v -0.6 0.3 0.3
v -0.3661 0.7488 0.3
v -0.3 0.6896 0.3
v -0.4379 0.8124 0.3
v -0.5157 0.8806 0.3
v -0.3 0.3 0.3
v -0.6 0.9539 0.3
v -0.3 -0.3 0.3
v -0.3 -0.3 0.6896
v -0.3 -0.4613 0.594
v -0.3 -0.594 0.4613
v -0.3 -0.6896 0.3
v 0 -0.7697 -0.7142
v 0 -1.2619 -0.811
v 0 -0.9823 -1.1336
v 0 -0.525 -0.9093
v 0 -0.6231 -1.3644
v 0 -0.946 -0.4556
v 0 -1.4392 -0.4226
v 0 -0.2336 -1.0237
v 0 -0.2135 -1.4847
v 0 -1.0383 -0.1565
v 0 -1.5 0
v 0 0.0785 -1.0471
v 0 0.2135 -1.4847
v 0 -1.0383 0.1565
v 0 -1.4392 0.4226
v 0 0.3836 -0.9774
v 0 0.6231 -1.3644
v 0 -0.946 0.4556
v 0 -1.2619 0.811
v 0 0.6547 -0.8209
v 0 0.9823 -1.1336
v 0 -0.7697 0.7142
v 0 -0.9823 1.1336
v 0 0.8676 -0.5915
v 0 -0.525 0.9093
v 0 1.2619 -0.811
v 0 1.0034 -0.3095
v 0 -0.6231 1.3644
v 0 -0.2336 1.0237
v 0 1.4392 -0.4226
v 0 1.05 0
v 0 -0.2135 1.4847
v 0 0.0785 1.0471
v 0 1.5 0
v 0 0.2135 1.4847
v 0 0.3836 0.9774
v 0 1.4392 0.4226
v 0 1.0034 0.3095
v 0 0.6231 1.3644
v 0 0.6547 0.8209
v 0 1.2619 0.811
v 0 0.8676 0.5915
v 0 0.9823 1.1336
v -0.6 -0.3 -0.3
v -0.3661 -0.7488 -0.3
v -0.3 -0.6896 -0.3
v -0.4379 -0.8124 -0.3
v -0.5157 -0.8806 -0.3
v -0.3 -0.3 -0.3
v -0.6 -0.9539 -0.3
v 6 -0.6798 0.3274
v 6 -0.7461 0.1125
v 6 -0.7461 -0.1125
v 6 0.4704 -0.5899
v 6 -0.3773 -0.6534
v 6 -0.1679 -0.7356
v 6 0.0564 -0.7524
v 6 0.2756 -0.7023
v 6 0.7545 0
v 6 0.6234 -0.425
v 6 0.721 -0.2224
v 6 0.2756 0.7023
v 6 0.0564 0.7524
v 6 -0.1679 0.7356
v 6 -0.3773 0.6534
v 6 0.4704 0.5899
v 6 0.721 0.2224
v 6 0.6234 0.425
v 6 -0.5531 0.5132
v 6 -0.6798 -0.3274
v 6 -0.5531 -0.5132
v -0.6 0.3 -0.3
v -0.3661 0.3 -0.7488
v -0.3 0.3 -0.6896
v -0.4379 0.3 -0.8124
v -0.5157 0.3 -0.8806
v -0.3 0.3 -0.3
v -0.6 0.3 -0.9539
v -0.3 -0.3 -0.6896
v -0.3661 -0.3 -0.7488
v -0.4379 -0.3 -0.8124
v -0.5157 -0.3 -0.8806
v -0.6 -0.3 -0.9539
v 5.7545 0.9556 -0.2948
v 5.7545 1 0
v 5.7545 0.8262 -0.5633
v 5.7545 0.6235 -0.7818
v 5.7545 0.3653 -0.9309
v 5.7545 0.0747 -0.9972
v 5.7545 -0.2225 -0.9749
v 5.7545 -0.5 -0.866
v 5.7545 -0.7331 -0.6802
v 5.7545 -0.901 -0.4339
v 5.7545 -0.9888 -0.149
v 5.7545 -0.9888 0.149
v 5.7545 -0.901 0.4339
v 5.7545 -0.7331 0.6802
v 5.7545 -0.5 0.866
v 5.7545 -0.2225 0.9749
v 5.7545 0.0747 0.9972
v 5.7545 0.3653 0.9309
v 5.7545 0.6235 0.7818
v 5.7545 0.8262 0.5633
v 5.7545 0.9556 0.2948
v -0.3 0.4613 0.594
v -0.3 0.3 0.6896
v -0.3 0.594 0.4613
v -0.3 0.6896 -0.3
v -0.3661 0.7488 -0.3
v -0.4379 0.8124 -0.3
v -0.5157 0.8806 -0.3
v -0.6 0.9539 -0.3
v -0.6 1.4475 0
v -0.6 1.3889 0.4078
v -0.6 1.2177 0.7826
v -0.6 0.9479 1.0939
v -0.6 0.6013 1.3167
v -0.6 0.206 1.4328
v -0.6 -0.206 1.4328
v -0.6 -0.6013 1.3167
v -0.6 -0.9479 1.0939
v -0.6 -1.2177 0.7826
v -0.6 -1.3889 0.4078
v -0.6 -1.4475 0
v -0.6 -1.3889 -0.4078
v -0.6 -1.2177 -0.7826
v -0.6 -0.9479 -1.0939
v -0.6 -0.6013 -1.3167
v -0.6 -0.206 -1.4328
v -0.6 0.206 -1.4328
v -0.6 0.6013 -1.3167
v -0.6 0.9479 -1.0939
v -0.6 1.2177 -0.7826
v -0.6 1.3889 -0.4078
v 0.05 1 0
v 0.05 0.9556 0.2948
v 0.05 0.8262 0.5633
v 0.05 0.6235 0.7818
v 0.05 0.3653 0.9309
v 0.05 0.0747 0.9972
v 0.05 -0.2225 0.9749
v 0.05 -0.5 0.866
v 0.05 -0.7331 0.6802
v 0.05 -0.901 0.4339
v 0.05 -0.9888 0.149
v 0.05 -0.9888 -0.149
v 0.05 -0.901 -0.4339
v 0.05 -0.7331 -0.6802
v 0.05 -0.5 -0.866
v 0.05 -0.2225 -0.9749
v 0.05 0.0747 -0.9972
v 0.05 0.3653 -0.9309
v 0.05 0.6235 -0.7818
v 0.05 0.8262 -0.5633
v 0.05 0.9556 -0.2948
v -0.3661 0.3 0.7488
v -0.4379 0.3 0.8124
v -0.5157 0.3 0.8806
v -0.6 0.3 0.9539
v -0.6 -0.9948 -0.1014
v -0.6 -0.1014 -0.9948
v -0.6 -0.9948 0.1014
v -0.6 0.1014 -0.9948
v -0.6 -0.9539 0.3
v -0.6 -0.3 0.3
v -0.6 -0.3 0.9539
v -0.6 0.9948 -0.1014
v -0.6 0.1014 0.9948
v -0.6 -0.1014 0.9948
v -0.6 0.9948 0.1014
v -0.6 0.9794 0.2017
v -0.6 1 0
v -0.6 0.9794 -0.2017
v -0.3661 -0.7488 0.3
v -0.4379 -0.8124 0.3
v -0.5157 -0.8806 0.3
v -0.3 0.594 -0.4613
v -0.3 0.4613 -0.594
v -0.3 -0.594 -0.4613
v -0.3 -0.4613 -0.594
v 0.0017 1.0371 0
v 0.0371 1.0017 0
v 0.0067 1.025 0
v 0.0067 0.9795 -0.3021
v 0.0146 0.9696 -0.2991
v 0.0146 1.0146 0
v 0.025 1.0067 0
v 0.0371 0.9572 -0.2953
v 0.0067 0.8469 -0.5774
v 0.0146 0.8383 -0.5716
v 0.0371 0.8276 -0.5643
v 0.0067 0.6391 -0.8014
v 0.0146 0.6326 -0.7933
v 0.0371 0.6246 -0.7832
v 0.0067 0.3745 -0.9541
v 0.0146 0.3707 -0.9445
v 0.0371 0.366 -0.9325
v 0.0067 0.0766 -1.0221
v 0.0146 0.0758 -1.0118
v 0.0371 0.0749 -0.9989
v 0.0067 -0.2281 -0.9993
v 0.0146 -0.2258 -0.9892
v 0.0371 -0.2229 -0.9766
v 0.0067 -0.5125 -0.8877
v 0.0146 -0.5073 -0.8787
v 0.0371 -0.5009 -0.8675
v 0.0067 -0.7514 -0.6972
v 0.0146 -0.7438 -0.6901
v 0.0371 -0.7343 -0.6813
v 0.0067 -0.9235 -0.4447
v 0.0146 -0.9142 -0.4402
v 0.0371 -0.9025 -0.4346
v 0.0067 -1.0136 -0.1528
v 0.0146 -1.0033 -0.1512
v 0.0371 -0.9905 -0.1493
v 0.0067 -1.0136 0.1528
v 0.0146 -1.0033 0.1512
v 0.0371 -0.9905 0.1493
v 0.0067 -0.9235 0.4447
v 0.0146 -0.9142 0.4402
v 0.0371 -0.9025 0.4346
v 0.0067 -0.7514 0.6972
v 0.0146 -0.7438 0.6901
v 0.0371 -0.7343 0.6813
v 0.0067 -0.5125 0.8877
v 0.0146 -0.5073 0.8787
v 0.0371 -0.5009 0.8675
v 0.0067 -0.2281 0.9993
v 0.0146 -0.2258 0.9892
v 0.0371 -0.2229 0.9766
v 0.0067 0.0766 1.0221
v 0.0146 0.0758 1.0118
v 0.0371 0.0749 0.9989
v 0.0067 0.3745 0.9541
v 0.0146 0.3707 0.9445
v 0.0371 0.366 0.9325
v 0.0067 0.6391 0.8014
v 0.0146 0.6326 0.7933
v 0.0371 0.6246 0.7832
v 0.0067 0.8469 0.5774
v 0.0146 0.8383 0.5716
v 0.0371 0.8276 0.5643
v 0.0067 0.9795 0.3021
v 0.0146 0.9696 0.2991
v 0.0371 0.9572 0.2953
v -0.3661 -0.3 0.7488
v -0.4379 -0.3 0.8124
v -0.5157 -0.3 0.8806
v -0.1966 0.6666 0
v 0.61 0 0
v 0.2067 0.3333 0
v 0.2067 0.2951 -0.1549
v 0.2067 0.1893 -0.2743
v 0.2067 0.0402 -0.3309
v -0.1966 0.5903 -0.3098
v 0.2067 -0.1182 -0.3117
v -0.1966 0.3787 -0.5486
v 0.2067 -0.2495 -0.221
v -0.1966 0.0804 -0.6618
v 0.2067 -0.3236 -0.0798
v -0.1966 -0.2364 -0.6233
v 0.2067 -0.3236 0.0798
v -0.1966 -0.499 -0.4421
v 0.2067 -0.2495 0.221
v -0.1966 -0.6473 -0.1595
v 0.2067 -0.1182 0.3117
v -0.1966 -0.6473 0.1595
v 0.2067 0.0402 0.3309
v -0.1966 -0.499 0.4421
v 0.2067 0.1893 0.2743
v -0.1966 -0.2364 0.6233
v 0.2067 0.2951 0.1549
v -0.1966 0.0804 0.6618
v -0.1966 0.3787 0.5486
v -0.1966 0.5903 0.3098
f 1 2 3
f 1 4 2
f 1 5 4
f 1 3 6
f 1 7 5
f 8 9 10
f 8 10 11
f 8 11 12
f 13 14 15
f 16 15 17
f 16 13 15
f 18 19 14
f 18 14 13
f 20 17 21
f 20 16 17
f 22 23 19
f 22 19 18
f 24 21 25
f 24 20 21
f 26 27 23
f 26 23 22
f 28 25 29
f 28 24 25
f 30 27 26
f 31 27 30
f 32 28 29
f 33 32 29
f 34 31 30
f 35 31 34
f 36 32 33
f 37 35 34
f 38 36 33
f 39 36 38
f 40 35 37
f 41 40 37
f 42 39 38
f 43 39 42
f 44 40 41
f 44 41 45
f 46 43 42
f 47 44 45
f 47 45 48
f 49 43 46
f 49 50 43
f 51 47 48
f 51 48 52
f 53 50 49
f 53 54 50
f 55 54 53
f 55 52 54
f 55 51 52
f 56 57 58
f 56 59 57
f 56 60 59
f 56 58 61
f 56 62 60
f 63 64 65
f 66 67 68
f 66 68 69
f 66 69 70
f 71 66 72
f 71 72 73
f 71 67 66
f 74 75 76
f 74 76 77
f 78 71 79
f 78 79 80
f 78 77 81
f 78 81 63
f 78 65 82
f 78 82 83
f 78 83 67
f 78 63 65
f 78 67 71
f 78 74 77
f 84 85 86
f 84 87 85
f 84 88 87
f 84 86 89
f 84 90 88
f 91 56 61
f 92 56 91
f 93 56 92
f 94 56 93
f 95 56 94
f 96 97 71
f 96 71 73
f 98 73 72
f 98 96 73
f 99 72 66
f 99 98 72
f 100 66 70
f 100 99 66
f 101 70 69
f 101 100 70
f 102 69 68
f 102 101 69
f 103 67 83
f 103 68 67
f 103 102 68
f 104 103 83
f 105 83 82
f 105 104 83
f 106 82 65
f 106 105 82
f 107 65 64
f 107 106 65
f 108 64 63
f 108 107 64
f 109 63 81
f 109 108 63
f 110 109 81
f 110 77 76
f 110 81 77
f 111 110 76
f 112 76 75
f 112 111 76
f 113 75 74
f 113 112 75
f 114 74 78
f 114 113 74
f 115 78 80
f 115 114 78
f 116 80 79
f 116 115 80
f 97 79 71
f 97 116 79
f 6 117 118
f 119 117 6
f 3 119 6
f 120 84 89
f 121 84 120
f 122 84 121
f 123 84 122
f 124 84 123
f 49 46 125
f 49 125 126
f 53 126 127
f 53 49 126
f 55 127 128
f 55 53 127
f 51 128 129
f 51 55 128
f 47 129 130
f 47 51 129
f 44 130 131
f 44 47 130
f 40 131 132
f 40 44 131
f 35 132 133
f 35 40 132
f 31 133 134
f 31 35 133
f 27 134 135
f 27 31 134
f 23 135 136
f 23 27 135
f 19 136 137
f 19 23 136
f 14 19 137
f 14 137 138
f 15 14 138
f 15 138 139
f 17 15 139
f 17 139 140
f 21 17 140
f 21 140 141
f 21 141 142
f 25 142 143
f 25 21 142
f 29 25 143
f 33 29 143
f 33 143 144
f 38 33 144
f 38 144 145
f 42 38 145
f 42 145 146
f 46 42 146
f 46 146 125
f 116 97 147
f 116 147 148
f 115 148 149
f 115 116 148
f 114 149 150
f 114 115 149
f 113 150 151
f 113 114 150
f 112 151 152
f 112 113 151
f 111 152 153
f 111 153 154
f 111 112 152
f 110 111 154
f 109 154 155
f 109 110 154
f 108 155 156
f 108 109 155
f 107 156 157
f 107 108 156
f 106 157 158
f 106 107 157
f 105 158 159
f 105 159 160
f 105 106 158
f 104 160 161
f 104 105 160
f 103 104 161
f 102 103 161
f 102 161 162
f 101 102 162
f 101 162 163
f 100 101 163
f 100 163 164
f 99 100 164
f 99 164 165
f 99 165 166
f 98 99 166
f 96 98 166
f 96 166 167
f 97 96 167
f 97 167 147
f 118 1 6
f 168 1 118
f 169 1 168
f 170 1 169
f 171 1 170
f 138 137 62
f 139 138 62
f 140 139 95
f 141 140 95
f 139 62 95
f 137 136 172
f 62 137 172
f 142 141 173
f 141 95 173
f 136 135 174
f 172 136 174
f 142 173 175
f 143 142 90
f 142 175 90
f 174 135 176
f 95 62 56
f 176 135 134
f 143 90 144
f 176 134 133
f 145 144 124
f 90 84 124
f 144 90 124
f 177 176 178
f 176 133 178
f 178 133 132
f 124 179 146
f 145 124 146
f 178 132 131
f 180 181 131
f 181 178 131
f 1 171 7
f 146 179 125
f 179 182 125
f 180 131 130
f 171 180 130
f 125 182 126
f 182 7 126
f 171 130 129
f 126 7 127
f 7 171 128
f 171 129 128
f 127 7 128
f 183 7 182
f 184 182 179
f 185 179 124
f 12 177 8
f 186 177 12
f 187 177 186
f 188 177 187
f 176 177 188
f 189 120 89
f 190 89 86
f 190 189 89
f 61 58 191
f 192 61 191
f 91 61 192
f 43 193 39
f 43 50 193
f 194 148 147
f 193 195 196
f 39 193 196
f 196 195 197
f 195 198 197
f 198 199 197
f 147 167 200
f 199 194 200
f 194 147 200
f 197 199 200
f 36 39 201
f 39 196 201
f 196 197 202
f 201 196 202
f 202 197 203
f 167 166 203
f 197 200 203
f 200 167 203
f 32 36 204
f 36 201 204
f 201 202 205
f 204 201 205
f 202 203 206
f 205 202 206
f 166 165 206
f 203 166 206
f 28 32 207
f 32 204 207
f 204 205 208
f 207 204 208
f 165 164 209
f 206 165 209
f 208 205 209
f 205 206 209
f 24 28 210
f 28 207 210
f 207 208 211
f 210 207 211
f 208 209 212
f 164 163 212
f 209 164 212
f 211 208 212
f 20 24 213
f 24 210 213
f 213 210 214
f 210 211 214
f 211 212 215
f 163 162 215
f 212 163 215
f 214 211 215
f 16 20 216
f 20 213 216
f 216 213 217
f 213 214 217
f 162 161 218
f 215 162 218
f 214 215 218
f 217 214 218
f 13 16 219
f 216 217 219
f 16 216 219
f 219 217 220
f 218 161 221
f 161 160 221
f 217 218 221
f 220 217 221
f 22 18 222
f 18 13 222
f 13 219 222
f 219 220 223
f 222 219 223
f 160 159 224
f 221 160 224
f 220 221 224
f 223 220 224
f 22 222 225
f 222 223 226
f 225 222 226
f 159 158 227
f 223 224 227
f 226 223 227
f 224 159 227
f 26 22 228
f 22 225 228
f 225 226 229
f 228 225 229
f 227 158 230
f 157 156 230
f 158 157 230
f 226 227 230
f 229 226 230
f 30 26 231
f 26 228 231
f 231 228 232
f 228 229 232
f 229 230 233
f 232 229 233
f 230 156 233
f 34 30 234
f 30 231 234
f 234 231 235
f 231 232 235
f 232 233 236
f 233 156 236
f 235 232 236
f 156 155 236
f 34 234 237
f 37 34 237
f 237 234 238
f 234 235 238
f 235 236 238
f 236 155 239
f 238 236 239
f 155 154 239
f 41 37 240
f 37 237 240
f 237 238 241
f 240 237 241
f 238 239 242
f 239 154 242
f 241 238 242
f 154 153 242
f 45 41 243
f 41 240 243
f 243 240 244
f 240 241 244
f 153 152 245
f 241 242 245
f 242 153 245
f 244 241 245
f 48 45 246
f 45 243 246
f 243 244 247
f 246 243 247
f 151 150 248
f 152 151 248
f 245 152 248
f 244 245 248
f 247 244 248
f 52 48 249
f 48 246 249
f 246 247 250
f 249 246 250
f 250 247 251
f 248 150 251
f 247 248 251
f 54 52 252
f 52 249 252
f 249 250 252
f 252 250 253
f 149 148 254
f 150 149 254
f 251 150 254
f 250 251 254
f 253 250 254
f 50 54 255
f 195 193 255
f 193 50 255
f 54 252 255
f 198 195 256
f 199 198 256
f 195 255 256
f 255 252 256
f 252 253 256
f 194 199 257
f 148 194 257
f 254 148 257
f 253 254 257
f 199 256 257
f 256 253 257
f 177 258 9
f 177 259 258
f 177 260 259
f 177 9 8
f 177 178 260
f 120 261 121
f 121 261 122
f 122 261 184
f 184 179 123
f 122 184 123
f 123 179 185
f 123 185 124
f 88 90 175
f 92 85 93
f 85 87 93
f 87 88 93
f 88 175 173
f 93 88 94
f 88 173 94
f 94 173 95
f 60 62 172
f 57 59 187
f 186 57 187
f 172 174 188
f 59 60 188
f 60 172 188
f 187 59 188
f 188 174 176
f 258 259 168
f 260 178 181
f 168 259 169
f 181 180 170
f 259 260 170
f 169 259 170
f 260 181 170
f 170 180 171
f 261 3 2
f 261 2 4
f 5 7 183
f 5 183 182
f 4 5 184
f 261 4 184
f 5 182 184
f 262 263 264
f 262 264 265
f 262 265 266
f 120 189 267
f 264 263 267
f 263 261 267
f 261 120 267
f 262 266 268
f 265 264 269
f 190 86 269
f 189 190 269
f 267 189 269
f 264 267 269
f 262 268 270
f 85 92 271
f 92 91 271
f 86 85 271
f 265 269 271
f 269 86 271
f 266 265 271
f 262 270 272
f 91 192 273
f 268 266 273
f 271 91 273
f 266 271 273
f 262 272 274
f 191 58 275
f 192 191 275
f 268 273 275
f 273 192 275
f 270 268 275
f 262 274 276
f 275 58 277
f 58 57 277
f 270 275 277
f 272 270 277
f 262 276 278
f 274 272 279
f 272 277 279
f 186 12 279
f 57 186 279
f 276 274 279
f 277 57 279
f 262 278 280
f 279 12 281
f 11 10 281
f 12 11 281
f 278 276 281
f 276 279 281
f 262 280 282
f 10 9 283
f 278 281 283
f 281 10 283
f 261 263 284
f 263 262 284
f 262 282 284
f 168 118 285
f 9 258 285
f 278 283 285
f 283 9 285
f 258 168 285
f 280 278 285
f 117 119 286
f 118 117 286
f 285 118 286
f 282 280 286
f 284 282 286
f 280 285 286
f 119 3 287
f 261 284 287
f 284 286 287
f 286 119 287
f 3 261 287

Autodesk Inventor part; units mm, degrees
sketch "Sketch_1" plane through (0, 0, 0) normal (0, 0, 1) x (1, 0, 0)
  line L0 (6, 0) -> (-0.6, 0)
  line L1 (-0.6, 0) -> (-0.6, 1.5)
  line L2 (-0.6, 1.5) -> (0, 1.5)
  line L3 (0, 1.5) -> (0, 1.05)
  arc A0 (0, 1.05) -> (0.05, 1) centre (0.05, 1.05) ccw
  line L4 (0.05, 1) -> (5.7545, 1)
  line L5 (5.7545, 1) -> (6, 0.7545)
  line L6 (6, 0.7545) -> (6, 0)
  line L7 (6, 0) -> (-0.6, 0)
revolve "Revolution1" add sketch "Sketch_1" angle 360 about axis through (6, 0, 0) along (1, 0, 0)
thread "Thread1" size "M2x0.4" class "6g" standard "ISO Metric profile" length 5.3545
sketch "Sketch_3" plane through (0, 0, 0) normal (0, 0, 1) x (1, 0, 0)
  line L0 (0.61, 0) -> (-0.6, 0)
  line L1 (-0.6, 0) -> (-0.6, 1)
  line L2 (-0.6, 1) -> (0.61, 0)
  line L3 (0.61, 0) -> (-0.6, 0)
revolve "Revolution2" cut sketch "Sketch_3" angle 360 about axis through (0.61, 0, 0) along (1, 0, 0)
sketch "Sketch_5" plane through (-0.6, 0, 0) normal (1, 0, 0) x (0, 0, -1)
  circle A0 centre (0, 0) radius 1.1
  arc A1 (-0.9539, 0.3) -> (-0.9539, -0.3) centre (0, 0) ccw
  line L0 (-0.9539, -0.3) -> (-0.3, -0.3)
  line L1 (-0.3, -0.3) -> (-0.3, -0.9539)
  arc A2 (-0.3, -0.9539) -> (0.3, -0.9539) centre (0, 0) ccw
  line L2 (0.3, -0.9539) -> (0.3, -0.3)
  line L3 (0.3, -0.3) -> (0.9539, -0.3)
  arc A3 (0.9539, -0.3) -> (0.9539, 0.3) centre (0, 0) ccw
  line L4 (0.9539, 0.3) -> (0.3, 0.3)
  line L5 (0.3, 0.3) -> (0.3, 0.9539)
  arc A4 (0.3, 0.9539) -> (-0.3, 0.9539) centre (0, 0) ccw
  line L6 (-0.3, 0.9539) -> (-0.3, 0.3)
  line L7 (-0.3, 0.3) -> (-0.9539, 0.3)
extrude "Extrusion1" add sketch "Sketch_5" along normal blind 0.3
sketch "Sketch_6" plane through (0, 0, 0) normal (0, 0, 1) x (1, 0, 0)
  line L0 (50, 0) -> (-50, 0)
  line L1 (-0.6, 1.5) -> (-0.6, 1.4475)
  line L2 (-0.6, 1.4475) -> (0, 1.5)
  line L3 (0, 1.5) -> (-0.6, 1.5)
revolve "Revolution3" cut sketch "Sketch_6" angle 360 about axis through (50, 0, 0) along (1, 0, 0)
ref_plane "screw_to_rail_XY" through (0, 0, 0) normal (-1, 0, 0) x (0, 0, -1)
ref_plane "screw_to_rail_YZ" through (0, 0, 0) normal (0, 0, -1) x (0, -1, 0)
ref_plane "screw_to_rail_ZX" through (0, 0, 0) normal (0, -1, 0) x (-1, 0, 0)
properties part number "M2x6_b"
